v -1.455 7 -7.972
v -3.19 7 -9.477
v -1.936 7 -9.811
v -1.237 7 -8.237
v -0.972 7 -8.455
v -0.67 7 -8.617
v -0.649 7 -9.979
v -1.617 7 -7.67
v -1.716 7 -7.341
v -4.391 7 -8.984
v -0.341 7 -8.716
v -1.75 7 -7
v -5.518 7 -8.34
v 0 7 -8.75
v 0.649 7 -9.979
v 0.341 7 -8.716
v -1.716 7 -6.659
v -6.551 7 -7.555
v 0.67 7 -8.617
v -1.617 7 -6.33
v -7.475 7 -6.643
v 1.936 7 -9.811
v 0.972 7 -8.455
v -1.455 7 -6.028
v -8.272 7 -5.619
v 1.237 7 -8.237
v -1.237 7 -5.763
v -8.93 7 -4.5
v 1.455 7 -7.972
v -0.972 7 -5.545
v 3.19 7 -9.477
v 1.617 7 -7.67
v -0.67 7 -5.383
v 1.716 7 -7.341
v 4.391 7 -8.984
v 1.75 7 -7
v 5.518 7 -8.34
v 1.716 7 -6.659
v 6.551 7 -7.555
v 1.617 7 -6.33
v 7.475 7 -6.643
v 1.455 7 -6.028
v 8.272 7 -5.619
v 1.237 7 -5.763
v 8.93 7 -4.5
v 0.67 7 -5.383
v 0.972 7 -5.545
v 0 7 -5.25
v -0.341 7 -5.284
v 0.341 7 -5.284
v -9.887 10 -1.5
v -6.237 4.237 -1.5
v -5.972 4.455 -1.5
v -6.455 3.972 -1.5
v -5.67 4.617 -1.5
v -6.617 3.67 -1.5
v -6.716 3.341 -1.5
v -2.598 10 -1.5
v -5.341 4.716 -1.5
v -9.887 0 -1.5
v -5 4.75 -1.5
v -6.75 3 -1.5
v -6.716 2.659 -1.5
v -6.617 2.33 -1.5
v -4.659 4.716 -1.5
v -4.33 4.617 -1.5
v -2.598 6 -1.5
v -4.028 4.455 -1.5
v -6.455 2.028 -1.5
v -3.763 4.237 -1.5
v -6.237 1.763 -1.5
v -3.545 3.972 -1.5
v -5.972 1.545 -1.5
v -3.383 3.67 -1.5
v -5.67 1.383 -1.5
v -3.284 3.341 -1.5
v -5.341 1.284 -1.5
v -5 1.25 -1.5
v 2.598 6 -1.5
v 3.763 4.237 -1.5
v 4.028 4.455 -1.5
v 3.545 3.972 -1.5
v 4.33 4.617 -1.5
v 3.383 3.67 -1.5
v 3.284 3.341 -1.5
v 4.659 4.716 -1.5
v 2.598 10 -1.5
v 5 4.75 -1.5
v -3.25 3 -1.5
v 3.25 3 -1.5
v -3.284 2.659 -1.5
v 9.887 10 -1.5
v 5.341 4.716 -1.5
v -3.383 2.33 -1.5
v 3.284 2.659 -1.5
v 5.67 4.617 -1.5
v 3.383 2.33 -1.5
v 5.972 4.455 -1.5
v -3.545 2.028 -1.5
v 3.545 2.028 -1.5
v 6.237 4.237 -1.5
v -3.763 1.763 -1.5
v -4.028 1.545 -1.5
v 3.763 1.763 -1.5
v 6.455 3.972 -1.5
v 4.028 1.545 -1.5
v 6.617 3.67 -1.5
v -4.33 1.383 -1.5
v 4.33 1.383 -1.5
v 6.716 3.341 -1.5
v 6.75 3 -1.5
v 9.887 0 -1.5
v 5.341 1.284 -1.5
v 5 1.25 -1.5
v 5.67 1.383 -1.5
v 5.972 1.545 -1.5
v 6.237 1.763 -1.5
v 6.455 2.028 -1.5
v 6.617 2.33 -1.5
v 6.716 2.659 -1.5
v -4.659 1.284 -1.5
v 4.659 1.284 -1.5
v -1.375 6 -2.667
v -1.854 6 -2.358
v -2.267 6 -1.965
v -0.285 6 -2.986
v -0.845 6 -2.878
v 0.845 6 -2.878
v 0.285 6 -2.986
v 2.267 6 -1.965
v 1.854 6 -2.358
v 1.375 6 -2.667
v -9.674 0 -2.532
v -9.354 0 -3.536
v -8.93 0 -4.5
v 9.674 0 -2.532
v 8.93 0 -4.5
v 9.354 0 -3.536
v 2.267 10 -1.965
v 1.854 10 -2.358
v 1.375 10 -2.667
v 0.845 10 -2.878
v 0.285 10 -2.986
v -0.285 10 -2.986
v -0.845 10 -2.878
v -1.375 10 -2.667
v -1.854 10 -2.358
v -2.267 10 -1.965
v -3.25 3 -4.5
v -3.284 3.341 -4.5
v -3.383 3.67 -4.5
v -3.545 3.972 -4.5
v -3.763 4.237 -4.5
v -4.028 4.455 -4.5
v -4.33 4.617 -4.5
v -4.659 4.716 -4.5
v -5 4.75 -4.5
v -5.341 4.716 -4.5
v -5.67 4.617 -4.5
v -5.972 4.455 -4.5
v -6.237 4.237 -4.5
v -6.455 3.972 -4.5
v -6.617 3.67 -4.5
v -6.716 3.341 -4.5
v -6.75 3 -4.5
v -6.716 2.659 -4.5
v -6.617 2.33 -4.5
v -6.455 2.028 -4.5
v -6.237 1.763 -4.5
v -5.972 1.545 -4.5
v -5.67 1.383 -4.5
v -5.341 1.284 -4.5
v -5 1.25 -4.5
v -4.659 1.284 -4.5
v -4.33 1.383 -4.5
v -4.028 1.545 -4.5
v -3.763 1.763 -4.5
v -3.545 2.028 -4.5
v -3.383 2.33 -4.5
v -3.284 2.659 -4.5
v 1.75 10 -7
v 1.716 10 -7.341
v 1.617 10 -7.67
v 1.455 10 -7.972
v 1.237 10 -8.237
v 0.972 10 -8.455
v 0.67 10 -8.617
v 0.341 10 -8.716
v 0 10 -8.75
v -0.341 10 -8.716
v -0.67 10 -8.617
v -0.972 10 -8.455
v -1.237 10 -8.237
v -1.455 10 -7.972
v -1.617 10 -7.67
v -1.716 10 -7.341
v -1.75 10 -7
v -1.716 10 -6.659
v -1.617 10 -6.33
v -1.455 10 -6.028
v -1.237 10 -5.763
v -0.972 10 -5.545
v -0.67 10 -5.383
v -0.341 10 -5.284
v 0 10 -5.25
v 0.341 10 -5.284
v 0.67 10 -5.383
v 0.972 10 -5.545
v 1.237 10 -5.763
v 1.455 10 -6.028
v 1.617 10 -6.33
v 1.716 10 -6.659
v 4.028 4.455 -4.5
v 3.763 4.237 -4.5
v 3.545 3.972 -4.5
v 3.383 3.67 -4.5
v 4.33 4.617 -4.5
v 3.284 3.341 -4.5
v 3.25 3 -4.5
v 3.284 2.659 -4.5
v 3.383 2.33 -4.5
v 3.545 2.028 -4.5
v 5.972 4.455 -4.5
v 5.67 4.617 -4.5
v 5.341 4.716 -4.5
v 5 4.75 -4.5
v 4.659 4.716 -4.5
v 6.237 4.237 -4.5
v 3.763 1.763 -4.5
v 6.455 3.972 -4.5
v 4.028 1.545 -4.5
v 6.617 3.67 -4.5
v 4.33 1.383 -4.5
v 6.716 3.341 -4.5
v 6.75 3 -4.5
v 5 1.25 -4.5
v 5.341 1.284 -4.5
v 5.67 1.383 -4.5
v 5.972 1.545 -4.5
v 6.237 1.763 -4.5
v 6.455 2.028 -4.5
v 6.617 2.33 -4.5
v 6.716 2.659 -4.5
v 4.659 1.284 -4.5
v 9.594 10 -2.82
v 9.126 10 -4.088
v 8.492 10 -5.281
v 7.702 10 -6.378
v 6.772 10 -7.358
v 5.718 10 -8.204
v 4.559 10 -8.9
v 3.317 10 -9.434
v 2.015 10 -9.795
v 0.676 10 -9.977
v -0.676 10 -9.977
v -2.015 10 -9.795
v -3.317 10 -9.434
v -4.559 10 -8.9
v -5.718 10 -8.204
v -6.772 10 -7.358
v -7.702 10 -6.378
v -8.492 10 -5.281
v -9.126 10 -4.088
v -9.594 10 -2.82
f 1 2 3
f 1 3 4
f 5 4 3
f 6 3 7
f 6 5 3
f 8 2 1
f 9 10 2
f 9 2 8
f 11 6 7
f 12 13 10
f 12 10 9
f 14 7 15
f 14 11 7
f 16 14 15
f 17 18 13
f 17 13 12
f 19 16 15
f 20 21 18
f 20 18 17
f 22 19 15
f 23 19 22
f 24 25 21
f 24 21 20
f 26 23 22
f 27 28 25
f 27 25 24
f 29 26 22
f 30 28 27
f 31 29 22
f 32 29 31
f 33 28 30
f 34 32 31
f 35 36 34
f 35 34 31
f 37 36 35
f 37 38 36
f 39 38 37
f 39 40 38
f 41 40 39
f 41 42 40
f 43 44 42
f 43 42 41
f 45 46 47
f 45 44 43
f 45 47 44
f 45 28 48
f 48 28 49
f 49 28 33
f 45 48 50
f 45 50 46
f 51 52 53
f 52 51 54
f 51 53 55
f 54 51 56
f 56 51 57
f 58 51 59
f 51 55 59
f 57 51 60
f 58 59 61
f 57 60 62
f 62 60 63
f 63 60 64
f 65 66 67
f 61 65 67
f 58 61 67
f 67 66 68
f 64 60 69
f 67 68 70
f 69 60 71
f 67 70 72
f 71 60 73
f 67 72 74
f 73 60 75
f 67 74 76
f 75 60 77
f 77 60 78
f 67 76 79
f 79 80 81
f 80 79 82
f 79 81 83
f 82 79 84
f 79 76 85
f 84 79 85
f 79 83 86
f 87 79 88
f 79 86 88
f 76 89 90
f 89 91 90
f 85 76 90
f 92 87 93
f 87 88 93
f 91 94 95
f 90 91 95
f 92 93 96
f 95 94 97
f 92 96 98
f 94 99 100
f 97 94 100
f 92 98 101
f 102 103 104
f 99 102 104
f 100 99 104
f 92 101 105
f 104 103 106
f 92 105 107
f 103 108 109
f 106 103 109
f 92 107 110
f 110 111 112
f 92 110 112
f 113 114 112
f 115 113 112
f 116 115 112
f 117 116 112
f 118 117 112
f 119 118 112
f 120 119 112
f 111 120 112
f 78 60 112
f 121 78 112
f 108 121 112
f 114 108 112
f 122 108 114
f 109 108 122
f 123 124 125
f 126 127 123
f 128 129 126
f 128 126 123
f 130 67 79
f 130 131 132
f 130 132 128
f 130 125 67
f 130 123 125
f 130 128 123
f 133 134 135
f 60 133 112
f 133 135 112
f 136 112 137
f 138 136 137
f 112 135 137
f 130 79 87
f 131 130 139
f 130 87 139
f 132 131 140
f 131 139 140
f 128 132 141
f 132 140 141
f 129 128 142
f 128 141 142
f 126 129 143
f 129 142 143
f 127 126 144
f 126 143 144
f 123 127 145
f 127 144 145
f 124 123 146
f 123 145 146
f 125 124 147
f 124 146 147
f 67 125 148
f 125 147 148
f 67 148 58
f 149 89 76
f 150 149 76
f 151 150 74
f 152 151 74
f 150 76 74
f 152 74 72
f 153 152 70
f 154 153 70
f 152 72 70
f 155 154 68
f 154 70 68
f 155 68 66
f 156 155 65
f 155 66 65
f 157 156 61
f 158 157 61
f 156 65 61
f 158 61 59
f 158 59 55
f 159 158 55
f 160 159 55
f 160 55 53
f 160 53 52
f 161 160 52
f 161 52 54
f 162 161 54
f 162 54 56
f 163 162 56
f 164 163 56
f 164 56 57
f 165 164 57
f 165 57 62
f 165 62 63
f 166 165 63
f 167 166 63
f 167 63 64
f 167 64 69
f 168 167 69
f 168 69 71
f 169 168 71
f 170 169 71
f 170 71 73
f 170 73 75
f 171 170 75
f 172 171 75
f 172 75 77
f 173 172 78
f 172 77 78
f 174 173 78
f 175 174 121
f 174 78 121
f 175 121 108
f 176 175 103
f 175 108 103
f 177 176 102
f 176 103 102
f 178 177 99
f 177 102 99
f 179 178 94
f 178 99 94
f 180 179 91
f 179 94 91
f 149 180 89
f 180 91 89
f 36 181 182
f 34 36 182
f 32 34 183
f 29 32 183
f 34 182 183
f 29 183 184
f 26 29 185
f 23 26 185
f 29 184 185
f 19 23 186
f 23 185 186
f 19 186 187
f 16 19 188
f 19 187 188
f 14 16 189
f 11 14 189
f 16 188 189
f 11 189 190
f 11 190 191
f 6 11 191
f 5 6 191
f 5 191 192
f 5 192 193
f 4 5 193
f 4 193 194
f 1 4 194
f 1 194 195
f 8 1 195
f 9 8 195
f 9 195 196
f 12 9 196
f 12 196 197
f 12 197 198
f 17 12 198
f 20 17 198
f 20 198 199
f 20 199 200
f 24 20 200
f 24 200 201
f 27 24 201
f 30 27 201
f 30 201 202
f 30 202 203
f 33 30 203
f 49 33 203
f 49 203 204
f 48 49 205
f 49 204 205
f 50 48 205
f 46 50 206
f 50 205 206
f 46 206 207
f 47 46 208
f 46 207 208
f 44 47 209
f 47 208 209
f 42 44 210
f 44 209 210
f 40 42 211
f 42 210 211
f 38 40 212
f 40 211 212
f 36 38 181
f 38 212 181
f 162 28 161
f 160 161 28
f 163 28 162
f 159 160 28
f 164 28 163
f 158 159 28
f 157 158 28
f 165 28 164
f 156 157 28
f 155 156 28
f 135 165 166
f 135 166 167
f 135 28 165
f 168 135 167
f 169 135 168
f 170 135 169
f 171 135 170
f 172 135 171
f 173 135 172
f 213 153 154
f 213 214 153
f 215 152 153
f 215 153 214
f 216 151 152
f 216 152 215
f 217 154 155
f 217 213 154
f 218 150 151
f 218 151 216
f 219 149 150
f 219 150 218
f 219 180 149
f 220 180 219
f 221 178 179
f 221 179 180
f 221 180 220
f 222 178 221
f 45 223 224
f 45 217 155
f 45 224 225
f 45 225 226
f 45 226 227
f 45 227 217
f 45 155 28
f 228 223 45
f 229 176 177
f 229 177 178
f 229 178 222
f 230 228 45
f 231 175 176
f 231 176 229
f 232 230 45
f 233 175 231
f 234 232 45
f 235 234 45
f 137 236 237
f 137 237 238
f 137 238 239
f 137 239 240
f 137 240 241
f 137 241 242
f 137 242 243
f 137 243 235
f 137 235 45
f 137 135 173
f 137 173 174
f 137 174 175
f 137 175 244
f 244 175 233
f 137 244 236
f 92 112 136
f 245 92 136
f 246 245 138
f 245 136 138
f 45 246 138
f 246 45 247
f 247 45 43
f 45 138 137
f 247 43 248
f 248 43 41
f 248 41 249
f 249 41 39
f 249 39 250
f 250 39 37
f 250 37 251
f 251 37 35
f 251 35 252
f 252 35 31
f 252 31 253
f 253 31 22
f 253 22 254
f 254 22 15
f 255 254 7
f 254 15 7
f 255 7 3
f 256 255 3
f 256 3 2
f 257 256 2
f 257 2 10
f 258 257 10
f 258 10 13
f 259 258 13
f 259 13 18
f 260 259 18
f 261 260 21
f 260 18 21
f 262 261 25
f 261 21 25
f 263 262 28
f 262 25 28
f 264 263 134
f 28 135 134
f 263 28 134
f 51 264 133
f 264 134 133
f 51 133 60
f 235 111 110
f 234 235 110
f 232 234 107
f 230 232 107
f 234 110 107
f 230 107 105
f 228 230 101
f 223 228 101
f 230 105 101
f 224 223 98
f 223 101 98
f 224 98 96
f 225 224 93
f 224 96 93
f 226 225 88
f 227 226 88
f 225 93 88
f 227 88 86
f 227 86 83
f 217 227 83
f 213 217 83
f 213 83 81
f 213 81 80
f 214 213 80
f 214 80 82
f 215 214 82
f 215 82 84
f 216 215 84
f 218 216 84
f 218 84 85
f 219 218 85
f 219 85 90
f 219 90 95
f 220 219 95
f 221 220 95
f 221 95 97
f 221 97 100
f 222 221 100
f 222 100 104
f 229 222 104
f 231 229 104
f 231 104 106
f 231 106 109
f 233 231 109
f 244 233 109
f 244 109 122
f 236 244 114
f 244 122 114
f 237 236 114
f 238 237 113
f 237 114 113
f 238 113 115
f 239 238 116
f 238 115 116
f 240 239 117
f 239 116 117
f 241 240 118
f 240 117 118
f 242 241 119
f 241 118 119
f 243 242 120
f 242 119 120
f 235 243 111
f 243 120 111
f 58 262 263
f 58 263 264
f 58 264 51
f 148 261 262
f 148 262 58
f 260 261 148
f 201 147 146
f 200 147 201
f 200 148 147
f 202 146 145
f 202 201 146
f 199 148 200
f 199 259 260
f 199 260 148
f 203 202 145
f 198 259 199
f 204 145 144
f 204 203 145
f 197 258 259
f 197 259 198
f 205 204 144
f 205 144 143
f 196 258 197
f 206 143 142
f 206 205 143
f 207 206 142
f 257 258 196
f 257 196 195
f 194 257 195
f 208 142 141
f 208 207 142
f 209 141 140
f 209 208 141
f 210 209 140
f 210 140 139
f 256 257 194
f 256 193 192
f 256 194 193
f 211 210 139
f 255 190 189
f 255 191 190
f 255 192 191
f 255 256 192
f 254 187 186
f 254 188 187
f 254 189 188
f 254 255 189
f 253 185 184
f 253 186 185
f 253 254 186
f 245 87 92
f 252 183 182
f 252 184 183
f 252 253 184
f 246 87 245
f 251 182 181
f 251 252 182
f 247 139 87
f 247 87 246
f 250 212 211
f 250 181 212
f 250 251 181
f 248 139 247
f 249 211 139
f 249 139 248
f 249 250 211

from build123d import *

# Parameters (mm, degrees)
SKETCH_1_R               = 10
EXTRUDE_1_DEPTH          = 10
CUT_EXTRUDE_1_DEPTH      = 10
CUT_EXTRUDE_1_DEPTH_BACK = 10
SKETCH_2_W               = 27.353123027
SKETCH_2_H               = 11.793746162
SKETCH_3_R               = 1.75
CUT_EXTRUDE_2_DEPTH      = 18.255433927
SKETCH_4_R               = 3
CUT_EXTRUDE_3_DEPTH      = 4
SKETCH_5_W               = 23.260827415
SKETCH_5_H               = 7
CUT_EXTRUDE_5_DEPTH      = 7
SKETCH_6_R               = 1.75
CUT_EXTRUDE_6_DEPTH      = 7


with BuildPart() as part:
    # Эскиз1 → Бобышка-Вытянуть1 (new body)
    with BuildSketch(Plane(origin=(0, 0, 0), x_dir=(1, 0, 0), z_dir=(0, 1, 0))):
        Circle(SKETCH_1_R)
    extrude(amount=EXTRUDE_1_DEPTH)

    # Эскиз2 → Вырез-Вытянуть1 (cut, two sides: drawn at the far end of the back side and taken through both)
    with BuildSketch(Plane(origin=(0, 0, 0), x_dir=(1, 0, 0), z_dir=(0, 1, 0)).offset(-CUT_EXTRUDE_1_DEPTH_BACK)):
        with Locations((1.294435554, -4.396873081)):
            Rectangle(SKETCH_2_W, SKETCH_2_H)
    extrude(amount=CUT_EXTRUDE_1_DEPTH + CUT_EXTRUDE_1_DEPTH_BACK, mode=Mode.SUBTRACT)

    # Эскиз3 → Вырез-Вытянуть2 (cut, through all)
    with BuildSketch(Plane(origin=(0, 10, 0), x_dir=(1, 0, 0), z_dir=(0, 1, 0))):
        with Locations((0, 7)):
            Circle(SKETCH_3_R)
    extrude(amount=-CUT_EXTRUDE_2_DEPTH, mode=Mode.SUBTRACT)

    # Эскиз4 → Вырез-Вытянуть3 (cut)
    with BuildSketch(Plane(origin=(0, 10, 0), x_dir=(1, 0, 0), z_dir=(0, 1, 0))):
        Circle(SKETCH_4_R)
    extrude(amount=-CUT_EXTRUDE_3_DEPTH, mode=Mode.SUBTRACT)

    # Эскиз5 → Вырез-Вытянуть5 (cut)
    with BuildSketch(Plane.XZ):
        with Locations((0.625951198, -8)):
            Rectangle(SKETCH_5_W, SKETCH_5_H)
    extrude(amount=-CUT_EXTRUDE_5_DEPTH, mode=Mode.SUBTRACT)

    # Эскиз6 → Вырез-Вытянуть6 (cut)
    with BuildSketch(Plane.XY.offset(-1.5)):
        with Locations((-5, 3)):
            Circle(SKETCH_6_R)
        with Locations((5, 3)):
            Circle(SKETCH_6_R)
    extrude(amount=-CUT_EXTRUDE_6_DEPTH, mode=Mode.SUBTRACT)


solid = part.part
